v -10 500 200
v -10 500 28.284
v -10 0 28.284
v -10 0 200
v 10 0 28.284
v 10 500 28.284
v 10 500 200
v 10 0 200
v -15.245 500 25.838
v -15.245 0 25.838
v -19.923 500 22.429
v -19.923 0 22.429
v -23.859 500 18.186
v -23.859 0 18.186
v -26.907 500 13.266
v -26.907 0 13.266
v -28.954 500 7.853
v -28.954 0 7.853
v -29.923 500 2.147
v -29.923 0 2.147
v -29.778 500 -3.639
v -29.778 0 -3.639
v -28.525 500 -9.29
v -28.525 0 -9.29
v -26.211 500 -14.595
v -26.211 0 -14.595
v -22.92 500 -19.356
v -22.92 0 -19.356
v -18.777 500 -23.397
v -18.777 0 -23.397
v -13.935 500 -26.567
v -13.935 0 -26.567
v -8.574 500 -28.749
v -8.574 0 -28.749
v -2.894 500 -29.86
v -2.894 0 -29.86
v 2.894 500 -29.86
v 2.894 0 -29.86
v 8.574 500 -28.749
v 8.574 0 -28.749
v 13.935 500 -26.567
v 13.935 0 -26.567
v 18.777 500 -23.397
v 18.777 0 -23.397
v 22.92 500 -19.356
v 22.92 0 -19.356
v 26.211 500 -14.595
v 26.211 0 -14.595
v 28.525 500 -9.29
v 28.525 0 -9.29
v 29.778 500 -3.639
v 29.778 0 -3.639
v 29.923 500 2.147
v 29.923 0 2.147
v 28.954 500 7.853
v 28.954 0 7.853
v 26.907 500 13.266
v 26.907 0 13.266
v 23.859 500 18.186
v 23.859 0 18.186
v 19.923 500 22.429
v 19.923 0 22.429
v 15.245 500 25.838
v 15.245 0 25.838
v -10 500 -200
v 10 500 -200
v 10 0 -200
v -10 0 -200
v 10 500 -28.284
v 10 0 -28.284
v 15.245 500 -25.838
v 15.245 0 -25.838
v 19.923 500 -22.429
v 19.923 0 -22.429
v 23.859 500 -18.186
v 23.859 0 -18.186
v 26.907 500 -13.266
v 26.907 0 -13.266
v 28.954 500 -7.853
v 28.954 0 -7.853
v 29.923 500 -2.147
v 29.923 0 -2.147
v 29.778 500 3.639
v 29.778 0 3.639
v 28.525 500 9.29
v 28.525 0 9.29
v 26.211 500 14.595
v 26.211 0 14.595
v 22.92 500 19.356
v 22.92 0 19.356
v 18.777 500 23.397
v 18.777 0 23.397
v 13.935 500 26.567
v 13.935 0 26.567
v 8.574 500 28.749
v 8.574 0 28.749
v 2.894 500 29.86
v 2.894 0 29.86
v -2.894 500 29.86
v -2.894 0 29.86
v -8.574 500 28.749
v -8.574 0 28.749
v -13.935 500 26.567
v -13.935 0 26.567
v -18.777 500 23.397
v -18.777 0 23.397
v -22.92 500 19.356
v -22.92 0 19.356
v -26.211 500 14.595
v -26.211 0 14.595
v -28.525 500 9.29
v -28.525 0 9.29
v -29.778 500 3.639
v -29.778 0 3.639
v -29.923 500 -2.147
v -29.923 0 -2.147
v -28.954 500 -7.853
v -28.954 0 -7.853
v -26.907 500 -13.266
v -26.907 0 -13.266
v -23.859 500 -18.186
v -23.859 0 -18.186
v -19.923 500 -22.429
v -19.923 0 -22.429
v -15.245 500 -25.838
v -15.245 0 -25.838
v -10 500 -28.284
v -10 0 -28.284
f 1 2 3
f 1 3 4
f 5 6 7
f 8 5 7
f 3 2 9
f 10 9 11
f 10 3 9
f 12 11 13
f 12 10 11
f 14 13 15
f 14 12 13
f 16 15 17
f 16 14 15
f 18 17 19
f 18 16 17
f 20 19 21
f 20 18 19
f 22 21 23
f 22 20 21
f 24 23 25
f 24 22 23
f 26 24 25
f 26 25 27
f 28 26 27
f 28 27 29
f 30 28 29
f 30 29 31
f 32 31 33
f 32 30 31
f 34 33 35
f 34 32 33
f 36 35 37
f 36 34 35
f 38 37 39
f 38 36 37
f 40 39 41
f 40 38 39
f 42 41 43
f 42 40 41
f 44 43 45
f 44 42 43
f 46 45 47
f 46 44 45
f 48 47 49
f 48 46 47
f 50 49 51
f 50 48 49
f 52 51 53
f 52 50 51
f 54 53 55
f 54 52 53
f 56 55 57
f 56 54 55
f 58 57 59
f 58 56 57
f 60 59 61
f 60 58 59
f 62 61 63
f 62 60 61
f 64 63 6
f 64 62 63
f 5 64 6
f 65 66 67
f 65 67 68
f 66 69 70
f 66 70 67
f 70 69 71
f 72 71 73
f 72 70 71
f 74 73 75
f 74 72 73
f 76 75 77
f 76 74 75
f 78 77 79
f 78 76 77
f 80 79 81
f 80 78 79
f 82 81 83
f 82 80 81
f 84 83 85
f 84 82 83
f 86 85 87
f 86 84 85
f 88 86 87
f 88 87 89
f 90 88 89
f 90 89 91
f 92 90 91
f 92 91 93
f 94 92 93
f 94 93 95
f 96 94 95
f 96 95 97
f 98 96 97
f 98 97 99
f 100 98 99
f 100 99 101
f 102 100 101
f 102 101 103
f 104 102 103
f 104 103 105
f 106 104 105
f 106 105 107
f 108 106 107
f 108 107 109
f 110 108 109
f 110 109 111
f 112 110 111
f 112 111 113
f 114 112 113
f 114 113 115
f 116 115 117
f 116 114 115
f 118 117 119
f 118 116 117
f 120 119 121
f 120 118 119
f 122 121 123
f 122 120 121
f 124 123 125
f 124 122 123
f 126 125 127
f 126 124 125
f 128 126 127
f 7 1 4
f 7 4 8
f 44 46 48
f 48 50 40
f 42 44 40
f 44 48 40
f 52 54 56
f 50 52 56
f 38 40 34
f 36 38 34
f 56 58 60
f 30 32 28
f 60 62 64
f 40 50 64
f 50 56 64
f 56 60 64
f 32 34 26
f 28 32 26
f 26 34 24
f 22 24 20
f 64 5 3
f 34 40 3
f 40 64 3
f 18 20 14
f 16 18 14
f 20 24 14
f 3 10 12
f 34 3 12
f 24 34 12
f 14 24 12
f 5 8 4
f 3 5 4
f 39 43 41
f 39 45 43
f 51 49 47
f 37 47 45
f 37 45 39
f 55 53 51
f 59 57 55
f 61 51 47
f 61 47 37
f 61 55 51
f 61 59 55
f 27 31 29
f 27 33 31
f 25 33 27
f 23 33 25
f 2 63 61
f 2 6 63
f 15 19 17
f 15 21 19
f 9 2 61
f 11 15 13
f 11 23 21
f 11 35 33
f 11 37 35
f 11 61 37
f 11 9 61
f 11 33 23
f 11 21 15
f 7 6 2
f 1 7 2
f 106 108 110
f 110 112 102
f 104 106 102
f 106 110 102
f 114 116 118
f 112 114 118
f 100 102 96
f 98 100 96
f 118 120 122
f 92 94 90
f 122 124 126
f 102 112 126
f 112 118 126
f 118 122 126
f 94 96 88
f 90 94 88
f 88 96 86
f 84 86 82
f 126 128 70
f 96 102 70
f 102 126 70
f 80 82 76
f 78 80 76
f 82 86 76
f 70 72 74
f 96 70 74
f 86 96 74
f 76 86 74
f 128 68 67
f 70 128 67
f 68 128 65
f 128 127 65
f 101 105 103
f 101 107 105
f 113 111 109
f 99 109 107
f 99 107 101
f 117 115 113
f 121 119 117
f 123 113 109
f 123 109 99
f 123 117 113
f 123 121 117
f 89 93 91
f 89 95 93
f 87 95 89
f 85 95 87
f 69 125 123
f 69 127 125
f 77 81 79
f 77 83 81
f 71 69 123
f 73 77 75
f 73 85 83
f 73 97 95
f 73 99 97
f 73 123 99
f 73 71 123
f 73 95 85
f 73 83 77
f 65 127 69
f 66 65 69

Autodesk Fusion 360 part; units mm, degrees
sketch "Sketch1" plane through (0, 0, 0) normal (0, 1, 0) x (1, 0, 0)
  circle A0 centre (0, 0) radius 30
extrude "Extrude1" add sketch "Sketch1" along normal blind 500 makes body 1
sketch "Sketch2" plane through (0, 500, 0) normal (0, 1, 0) x (-1, 0, 0)
  circle A0 centre (0, 0) radius 30
  line L0 (0, 0) -> (10, 0)
  line L1 (10, 0) -> (10, -200)
  line L2 (10, -200) -> (0, -200)
  line L3 (0, 0) -> (-10, 0)
  line L4 (-10, 0) -> (-10, -200)
  line L5 (-10, -200) -> (0, -200)
extrude "Extrude2" add sketch "Sketch2" against normal blind 500 contours A0 L1 L2 L4 L5 bodies 1
pattern_circular "C-Pattern1" count 2 over 360 about axis through (0, 0, 0) along (0, 1, 0) of bodies 1 makes body 2
